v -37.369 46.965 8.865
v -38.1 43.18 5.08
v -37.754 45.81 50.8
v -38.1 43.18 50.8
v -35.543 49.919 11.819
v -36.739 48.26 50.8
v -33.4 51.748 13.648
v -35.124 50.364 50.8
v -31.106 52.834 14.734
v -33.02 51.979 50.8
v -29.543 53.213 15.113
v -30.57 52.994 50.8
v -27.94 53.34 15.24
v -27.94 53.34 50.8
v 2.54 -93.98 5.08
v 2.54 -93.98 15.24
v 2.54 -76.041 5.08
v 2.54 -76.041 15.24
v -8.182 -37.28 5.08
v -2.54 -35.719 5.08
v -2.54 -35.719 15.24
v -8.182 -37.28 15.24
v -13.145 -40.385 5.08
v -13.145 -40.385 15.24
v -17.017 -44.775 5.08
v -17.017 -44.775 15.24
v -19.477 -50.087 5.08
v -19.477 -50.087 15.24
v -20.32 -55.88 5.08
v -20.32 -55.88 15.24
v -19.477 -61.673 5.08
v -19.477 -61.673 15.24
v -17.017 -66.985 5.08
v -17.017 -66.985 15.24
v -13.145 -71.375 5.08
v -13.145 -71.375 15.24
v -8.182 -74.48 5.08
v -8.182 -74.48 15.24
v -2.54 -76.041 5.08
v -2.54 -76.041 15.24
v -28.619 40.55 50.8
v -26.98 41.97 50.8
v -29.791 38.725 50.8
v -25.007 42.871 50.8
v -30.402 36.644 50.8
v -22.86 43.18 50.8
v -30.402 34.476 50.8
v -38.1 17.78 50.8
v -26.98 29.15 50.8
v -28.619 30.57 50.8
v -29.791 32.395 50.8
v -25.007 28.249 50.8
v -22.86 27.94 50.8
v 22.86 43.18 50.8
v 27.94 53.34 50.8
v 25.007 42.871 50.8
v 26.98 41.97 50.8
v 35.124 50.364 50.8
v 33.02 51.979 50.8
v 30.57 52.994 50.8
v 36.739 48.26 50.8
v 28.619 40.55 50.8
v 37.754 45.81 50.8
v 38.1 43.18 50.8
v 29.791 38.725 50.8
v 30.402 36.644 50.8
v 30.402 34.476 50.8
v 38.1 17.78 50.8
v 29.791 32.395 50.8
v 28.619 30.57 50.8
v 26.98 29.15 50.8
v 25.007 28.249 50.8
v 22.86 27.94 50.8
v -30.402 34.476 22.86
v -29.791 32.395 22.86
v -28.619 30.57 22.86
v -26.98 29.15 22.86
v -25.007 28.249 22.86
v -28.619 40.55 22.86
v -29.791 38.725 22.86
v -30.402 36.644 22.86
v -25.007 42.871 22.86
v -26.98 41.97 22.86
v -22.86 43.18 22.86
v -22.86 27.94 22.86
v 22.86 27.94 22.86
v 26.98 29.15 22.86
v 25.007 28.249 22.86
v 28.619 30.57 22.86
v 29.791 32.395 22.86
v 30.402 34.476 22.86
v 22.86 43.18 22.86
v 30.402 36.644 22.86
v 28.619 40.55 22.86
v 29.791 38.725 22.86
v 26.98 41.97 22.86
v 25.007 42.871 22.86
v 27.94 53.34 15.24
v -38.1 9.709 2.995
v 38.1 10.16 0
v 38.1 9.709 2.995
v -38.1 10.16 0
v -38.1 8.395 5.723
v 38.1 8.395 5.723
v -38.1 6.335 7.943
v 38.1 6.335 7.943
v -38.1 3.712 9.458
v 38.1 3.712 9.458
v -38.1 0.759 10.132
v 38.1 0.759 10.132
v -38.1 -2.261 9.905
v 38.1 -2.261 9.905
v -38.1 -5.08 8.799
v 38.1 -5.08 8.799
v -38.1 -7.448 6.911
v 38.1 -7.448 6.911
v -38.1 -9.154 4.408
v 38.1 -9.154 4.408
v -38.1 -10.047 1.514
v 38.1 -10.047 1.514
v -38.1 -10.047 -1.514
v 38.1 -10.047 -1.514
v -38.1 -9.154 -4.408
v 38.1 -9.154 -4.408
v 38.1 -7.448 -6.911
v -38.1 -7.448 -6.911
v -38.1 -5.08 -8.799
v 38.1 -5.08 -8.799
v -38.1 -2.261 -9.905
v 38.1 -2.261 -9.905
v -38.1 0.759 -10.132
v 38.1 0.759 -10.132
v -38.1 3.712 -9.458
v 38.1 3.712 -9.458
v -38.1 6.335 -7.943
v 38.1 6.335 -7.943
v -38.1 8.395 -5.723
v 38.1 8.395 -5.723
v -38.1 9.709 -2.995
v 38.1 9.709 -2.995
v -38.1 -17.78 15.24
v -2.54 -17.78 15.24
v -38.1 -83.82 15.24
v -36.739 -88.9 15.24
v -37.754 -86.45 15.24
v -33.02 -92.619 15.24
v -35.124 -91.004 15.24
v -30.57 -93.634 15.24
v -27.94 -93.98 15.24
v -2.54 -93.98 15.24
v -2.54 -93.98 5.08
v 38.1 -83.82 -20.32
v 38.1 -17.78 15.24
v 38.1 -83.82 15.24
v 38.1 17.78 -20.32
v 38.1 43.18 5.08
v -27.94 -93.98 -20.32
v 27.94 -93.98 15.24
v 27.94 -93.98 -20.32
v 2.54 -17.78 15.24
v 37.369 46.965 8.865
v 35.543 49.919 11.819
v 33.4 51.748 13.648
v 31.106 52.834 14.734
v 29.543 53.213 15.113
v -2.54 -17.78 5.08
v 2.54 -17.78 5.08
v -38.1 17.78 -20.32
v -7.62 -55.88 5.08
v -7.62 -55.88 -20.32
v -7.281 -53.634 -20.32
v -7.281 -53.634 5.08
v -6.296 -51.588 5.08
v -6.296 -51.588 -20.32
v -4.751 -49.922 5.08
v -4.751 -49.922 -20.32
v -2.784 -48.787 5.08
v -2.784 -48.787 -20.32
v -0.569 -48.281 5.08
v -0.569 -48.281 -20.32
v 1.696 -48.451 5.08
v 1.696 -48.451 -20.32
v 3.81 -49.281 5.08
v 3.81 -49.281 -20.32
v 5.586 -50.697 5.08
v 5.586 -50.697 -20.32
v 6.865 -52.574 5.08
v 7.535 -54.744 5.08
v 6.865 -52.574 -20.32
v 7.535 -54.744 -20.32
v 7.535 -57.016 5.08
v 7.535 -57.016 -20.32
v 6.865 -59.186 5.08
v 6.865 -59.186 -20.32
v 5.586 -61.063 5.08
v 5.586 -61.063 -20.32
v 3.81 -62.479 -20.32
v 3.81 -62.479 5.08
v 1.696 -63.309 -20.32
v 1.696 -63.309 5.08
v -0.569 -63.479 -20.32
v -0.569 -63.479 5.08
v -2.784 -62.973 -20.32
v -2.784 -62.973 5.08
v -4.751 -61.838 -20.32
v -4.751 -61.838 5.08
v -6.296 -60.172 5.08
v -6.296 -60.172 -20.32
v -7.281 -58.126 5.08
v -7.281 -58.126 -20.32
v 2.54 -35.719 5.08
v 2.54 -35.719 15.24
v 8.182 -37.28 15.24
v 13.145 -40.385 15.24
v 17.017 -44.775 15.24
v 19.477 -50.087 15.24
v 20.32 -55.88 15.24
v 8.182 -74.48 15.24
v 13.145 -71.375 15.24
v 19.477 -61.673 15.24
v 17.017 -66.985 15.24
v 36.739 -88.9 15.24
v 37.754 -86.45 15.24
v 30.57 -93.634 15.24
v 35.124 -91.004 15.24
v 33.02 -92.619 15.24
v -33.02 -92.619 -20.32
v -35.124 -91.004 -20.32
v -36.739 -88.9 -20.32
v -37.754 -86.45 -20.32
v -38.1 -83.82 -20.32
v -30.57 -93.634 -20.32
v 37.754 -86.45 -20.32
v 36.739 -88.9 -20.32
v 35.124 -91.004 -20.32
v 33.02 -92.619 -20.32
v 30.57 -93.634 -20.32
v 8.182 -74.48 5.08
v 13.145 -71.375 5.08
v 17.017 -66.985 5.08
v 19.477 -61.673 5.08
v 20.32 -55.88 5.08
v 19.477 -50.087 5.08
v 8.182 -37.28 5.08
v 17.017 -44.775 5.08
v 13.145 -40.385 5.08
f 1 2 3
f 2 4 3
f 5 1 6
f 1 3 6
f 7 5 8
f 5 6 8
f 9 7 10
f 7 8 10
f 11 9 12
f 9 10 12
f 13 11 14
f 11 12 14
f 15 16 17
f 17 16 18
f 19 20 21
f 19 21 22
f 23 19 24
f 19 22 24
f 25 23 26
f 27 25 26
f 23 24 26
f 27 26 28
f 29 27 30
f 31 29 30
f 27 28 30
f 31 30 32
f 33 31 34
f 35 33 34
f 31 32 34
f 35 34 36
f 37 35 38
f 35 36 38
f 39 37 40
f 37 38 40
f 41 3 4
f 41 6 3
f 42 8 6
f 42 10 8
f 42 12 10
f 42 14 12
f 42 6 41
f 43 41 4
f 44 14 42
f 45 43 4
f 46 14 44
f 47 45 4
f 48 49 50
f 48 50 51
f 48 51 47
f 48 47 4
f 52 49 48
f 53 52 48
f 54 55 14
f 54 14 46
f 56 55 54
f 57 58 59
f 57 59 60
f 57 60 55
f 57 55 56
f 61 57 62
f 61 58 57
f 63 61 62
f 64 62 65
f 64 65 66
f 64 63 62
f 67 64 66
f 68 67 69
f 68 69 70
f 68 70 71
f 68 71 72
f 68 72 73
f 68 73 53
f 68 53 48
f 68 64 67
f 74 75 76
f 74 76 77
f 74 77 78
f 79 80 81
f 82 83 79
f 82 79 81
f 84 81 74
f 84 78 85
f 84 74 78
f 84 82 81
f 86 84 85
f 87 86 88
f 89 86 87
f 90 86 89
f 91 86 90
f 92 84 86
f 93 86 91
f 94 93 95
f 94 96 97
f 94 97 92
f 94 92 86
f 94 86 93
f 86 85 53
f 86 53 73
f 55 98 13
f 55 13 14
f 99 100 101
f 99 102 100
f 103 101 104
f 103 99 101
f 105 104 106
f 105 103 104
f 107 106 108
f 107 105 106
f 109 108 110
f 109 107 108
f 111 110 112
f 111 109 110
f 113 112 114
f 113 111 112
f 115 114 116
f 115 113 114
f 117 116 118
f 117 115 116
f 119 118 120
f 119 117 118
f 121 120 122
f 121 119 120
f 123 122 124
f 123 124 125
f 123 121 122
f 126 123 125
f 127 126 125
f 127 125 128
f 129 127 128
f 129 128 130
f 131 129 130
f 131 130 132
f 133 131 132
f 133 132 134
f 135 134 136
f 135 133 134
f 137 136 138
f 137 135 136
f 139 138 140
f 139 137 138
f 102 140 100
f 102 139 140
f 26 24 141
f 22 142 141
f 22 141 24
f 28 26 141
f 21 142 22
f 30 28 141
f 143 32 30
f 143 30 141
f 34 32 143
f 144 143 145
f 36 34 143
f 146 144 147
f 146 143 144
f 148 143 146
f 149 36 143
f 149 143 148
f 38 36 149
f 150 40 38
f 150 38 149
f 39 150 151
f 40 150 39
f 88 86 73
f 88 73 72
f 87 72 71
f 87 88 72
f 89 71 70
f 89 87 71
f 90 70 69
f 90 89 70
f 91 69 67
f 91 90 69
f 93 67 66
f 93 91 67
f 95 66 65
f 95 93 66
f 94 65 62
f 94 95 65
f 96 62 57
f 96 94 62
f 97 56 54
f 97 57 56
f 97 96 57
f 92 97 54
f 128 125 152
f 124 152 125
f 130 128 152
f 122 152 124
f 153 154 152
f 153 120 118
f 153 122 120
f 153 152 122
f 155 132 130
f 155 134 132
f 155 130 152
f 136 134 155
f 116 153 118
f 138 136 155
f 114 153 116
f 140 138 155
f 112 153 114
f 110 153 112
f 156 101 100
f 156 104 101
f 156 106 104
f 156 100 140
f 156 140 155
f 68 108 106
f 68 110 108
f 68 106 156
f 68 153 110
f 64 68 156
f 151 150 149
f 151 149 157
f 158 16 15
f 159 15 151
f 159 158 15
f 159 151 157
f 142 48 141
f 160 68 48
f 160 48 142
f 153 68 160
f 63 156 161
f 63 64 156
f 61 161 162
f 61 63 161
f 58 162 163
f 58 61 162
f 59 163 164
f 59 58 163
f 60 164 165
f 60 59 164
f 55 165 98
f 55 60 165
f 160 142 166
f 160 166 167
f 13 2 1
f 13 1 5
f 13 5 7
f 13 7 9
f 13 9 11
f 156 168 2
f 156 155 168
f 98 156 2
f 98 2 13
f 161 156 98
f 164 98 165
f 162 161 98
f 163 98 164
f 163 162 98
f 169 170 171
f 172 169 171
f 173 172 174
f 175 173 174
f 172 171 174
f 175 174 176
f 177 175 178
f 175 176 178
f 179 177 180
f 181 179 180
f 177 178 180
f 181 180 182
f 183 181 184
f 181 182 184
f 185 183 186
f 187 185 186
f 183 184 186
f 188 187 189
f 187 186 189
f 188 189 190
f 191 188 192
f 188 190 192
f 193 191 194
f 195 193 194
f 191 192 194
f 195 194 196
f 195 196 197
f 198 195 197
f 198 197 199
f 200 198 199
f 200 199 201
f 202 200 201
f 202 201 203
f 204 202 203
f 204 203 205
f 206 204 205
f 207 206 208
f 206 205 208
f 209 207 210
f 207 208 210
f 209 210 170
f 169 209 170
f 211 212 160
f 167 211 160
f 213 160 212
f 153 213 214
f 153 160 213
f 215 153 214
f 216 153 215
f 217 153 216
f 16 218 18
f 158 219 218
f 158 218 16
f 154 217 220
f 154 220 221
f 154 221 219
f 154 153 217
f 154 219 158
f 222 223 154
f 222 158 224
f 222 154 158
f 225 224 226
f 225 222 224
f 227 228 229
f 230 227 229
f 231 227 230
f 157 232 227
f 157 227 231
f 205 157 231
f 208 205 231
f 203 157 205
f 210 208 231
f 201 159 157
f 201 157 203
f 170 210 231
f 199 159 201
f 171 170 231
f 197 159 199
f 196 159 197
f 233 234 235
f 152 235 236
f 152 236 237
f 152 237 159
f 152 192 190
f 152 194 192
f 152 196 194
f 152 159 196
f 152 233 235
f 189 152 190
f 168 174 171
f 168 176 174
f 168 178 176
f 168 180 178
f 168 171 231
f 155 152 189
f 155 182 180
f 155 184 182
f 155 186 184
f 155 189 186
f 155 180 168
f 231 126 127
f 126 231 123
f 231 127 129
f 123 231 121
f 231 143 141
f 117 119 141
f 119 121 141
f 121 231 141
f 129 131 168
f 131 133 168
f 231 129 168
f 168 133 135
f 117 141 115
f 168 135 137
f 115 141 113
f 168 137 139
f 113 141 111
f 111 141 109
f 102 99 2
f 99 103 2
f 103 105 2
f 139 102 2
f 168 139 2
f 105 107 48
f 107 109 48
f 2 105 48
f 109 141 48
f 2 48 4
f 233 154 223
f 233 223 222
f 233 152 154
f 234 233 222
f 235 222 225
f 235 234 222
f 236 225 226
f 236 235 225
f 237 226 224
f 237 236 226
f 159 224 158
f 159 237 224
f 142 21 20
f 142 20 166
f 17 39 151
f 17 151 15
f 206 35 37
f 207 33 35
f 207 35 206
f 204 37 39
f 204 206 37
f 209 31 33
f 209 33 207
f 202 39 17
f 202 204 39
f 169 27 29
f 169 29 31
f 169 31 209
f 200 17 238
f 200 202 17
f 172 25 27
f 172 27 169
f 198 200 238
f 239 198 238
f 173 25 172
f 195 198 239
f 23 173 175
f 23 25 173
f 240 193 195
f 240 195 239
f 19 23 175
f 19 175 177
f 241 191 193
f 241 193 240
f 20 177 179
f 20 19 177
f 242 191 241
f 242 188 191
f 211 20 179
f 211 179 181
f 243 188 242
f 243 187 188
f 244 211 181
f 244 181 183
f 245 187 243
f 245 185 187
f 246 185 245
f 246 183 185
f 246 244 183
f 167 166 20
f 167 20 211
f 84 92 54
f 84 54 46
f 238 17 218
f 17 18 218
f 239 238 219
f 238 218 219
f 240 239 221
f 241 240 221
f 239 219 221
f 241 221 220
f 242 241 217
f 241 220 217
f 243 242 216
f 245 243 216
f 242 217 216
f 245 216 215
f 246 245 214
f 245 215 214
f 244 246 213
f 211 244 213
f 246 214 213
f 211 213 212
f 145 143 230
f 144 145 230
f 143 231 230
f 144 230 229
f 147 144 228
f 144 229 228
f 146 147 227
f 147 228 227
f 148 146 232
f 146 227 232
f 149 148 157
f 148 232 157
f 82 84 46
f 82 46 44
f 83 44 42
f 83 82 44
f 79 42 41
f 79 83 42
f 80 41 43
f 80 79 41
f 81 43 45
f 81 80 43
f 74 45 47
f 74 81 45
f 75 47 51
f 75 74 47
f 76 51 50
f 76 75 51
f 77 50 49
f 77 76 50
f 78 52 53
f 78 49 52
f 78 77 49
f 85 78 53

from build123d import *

# Parameters (mm, degrees)
F0_R           = 10.16
F1_DEPTH       = 38.1
F3_START       = 7.62
F3_DEPTH       = 27.941
F4_D           = 15.24
F4_CBORE_D     = 40.64
F4_CBORE_DEPTH = 10.16
F2_W           = 5.08
F2_H           = 76.2
F5_DEPTH       = 10.16
F6_R           = 10.16


with BuildPart() as f1:
    # F0 (on Right) → F1 (new body, symmetric)
    with BuildSketch(Plane.YZ):
        Polygon((-17.78, 15.24), (-93.98, 15.24), (-93.98, -20.32), (17.78, -20.32), (53.34, 15.24), (53.34, 50.8), (17.78, 50.8), align=None)
        Circle(F0_R, mode=Mode.SUBTRACT)
    extrude(amount=F1_DEPTH, both=True)

    # F2 (on face) → F3 (cut)
    with BuildSketch(Plane.XY.offset(15.24).offset(F3_START)):
        with BuildLine():
            Line((22.86, 43.18), (-22.86, 43.18))
            ThreePointArc((-22.86, 43.18), (-30.48, 35.56), (-22.86, 27.94))
            Line((-22.86, 27.94), (22.86, 27.94))
            ThreePointArc((22.86, 27.94), (30.48, 35.56), (22.86, 43.18))
        make_face()
    extrude(amount=F3_DEPTH, mode=Mode.SUBTRACT)

    # F4 (through all)
    with Locations(Plane.XY.offset(15.24)):
        with Locations((0, -55.88)):
            CounterBoreHole(F4_D / 2, F4_CBORE_D / 2, F4_CBORE_DEPTH)

    # F2 (on face) → F5 (cut)
    with BuildSketch(Plane.XY.offset(15.24)):
        with Locations((0, -55.88)):
            Rectangle(F2_W, F2_H)
    extrude(amount=-F5_DEPTH, mode=Mode.SUBTRACT)

    # F6
    f6_edges = [f1.edges().sort_by_distance(p)[0] for p in [
        (38.1, -93.98, -2.54),
        (-38.1, -93.98, -2.54),
        (38.1, 53.34, 33.02),
        (-38.1, 53.34, 33.02),
    ]]
    fillet(f6_edges, radius=F6_R)


solid = f1.part
